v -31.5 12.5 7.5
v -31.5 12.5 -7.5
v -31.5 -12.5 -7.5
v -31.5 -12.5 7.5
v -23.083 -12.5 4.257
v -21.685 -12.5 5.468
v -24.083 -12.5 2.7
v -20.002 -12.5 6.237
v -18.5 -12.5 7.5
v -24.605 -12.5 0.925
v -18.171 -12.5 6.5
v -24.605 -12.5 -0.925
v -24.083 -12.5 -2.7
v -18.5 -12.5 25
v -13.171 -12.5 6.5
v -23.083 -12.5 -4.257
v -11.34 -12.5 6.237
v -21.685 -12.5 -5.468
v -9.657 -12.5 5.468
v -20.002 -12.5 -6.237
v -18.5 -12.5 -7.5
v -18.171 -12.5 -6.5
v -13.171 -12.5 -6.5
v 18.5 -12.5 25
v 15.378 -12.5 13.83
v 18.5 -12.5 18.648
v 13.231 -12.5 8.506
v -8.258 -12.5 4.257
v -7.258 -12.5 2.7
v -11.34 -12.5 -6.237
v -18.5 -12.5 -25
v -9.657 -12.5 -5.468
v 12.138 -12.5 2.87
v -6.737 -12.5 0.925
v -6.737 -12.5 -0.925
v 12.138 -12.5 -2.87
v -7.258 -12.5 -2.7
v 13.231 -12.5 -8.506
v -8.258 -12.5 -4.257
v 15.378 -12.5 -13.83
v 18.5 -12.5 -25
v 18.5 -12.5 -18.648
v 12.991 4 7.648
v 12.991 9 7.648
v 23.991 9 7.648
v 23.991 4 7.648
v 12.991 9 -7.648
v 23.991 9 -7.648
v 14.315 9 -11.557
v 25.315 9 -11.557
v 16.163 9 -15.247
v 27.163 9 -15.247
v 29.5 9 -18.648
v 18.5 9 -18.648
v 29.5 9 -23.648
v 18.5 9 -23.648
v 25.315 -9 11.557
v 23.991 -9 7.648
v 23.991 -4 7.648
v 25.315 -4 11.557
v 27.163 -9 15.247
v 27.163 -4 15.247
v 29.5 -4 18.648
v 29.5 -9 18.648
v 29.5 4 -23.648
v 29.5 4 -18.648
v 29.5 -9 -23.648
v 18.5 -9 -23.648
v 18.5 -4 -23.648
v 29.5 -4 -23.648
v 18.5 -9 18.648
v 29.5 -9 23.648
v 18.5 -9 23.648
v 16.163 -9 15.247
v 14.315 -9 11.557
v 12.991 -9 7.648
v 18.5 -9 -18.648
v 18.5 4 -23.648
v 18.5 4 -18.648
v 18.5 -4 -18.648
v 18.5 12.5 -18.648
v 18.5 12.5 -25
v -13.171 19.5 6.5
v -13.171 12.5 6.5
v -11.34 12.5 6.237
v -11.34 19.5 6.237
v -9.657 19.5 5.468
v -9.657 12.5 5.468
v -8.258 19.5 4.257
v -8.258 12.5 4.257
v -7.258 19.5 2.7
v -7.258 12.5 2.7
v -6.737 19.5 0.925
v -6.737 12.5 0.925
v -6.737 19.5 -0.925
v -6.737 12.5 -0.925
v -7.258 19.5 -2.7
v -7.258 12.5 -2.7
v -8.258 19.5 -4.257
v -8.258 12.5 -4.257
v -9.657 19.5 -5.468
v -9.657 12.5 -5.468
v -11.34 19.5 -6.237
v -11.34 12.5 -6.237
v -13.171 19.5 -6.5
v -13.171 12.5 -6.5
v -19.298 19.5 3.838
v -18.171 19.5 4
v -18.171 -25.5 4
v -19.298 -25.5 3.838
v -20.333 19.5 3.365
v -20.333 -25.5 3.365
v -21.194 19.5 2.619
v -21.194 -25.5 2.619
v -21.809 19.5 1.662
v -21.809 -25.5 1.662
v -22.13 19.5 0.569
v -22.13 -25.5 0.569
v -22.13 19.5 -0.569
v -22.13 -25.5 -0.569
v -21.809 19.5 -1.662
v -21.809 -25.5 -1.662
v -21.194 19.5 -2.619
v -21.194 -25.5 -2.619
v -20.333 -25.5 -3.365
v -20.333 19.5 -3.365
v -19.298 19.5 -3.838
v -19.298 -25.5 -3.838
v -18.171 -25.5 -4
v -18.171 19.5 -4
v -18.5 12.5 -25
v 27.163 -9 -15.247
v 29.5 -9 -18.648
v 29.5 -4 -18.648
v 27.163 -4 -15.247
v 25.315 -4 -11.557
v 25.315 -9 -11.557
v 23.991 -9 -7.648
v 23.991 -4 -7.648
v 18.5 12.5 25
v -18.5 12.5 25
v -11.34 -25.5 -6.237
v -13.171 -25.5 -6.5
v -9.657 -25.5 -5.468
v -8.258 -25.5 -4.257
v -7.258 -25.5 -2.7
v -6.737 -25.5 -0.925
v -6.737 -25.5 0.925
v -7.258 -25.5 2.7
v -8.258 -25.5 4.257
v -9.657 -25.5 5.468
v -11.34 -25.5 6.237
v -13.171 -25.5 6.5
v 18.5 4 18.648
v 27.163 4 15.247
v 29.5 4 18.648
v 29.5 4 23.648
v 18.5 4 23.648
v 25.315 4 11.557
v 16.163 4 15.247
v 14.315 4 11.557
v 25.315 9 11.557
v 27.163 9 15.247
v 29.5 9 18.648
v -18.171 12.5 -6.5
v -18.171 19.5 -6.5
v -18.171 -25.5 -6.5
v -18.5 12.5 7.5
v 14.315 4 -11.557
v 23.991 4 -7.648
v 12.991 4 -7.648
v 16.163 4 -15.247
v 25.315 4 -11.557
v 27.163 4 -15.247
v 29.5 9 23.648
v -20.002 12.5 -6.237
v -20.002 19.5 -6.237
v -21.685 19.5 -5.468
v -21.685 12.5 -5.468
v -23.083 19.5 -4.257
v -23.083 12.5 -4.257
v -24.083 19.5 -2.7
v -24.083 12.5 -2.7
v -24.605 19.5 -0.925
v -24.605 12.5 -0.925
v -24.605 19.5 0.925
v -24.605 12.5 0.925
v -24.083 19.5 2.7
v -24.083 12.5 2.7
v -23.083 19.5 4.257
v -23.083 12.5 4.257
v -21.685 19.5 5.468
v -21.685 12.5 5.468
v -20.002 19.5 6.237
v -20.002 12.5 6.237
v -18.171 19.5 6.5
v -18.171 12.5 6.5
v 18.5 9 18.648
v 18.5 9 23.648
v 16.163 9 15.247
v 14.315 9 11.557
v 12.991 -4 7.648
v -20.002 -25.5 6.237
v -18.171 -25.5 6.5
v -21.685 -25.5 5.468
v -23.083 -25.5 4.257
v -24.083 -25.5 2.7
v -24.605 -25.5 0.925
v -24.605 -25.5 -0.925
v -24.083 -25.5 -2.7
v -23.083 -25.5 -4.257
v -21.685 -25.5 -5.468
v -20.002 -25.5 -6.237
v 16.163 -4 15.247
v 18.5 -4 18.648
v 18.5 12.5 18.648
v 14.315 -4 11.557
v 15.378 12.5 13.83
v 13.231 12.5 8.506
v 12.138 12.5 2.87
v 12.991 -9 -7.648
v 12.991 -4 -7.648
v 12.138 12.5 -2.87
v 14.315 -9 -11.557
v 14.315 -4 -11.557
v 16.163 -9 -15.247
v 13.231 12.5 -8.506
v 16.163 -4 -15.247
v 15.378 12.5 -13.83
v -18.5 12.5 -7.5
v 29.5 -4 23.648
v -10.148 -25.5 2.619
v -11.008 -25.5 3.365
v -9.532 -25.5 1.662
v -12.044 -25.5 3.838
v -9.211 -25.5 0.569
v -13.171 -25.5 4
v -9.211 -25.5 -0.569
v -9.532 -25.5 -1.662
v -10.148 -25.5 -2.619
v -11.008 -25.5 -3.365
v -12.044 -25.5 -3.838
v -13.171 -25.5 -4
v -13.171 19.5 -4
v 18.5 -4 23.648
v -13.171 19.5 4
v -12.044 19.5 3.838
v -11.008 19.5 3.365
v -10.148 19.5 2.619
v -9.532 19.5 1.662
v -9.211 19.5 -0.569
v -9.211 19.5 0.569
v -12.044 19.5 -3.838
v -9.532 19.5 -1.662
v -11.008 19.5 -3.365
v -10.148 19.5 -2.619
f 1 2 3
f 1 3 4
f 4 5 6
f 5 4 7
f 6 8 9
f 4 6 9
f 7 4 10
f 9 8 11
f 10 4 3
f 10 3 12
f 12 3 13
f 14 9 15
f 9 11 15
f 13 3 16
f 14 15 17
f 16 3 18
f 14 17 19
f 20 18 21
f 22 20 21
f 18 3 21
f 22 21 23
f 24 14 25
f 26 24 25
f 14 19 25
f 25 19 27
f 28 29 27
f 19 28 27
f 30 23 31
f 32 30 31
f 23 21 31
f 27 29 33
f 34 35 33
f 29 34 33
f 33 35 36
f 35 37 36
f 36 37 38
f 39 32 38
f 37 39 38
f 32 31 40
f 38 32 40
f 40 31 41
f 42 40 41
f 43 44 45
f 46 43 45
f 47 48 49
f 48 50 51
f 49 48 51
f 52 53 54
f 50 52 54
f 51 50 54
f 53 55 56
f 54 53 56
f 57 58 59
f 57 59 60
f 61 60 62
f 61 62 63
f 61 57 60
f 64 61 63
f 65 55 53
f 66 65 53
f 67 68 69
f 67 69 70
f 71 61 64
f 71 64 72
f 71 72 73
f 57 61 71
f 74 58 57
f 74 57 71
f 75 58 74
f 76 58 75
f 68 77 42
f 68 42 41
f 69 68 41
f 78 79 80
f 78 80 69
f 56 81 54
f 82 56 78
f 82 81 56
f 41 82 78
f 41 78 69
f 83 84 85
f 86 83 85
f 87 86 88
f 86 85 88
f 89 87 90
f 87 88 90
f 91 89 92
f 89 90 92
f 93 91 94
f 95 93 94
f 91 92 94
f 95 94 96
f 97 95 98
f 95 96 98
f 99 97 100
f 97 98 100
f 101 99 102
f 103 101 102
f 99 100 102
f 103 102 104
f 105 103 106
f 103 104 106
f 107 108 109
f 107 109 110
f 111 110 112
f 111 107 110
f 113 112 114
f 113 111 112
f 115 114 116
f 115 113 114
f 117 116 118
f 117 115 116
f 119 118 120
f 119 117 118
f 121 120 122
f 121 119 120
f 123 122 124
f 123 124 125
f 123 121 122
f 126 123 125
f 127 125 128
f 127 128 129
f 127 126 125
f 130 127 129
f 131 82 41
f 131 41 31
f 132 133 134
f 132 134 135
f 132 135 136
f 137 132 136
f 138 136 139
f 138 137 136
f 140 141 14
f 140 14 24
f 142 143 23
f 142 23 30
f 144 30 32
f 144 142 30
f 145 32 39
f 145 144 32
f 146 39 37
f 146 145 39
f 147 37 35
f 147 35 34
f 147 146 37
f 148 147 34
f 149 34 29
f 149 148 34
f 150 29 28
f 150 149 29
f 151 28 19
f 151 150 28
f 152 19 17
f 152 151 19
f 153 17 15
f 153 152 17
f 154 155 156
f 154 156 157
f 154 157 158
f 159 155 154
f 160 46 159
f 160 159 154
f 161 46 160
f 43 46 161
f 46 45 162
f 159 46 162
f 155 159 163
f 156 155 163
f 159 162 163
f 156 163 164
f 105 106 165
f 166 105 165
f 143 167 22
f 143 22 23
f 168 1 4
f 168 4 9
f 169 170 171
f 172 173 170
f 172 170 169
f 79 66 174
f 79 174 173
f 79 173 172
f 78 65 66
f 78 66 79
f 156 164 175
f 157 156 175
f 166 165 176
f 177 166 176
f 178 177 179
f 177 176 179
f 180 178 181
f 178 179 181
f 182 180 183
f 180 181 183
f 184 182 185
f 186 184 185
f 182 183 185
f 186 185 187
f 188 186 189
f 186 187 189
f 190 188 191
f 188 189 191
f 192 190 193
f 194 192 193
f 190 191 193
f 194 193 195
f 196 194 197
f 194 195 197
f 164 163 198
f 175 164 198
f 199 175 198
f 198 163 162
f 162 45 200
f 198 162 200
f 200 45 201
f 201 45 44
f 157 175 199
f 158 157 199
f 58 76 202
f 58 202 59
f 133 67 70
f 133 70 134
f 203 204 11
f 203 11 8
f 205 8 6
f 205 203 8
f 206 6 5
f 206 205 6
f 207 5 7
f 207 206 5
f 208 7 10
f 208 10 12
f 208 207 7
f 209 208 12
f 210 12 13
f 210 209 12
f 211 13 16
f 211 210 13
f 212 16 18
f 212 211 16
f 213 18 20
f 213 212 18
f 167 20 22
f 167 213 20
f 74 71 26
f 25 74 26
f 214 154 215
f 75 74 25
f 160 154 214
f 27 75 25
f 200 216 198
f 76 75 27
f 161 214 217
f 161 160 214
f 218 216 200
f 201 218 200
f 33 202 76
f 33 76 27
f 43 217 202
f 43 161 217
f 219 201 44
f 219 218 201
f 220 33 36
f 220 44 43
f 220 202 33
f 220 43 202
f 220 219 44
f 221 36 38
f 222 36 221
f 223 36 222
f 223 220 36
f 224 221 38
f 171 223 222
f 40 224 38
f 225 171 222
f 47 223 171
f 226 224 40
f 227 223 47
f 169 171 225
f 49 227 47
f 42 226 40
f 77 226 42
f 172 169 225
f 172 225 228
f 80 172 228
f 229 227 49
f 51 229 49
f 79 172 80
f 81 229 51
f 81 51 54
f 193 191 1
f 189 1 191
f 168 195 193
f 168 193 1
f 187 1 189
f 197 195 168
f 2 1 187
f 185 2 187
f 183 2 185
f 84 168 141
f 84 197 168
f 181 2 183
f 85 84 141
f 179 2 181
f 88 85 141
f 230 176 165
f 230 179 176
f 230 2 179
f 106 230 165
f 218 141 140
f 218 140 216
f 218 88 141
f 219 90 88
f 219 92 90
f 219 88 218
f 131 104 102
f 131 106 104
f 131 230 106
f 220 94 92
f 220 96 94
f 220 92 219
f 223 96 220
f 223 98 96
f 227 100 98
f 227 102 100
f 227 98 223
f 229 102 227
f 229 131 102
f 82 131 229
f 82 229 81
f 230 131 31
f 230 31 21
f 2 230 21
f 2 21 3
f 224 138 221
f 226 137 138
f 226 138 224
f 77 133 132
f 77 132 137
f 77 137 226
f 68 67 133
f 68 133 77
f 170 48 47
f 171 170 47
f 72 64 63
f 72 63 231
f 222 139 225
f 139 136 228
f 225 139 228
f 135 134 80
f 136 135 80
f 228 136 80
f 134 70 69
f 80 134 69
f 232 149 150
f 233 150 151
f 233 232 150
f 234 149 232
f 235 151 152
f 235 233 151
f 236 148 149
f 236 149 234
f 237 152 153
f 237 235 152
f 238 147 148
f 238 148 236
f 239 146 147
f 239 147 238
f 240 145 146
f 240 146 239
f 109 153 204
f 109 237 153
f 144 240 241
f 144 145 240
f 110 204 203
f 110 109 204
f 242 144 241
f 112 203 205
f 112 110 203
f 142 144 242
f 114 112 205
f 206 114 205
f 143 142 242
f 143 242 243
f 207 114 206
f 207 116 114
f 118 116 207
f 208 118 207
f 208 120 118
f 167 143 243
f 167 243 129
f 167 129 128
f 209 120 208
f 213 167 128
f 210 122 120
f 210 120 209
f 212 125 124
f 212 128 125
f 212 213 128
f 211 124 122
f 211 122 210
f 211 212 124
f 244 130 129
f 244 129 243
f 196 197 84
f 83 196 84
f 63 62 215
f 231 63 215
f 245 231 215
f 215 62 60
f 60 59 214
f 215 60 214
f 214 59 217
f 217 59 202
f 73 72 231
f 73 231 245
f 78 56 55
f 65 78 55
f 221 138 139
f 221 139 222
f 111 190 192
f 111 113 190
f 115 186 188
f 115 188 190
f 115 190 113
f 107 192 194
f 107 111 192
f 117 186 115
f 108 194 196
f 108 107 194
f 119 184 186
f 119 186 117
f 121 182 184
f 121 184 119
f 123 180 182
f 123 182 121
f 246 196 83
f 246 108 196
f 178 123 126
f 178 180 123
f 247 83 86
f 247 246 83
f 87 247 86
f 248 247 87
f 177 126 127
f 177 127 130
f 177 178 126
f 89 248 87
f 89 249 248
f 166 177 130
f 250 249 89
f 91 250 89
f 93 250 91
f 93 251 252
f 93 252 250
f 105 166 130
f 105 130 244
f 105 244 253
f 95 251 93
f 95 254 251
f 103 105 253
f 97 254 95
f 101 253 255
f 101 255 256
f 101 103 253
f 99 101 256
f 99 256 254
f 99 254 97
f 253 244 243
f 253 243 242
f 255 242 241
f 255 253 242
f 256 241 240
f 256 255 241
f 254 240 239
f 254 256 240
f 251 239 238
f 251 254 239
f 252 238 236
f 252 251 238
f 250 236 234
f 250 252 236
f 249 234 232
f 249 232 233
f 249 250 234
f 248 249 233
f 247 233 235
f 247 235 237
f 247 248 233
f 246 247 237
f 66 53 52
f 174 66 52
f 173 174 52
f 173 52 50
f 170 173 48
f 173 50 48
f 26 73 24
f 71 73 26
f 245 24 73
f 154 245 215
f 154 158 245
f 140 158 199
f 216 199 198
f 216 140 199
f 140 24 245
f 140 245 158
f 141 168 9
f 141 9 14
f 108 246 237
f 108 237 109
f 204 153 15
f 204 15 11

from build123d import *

# Parameters (mm, degrees)
EXTRUDE_1_DEPTH     = 12.5
EXTRUDE_START       = 5
EXTRUDE_3_DEPTH     = 5
EXTRUDE_4_DEPTH     = 7
EXTRUDE_START_2     = -45
EXTRUDE_5_DEPTH     = 45
CUT_EXTRUDE_1_DEPTH = 45


with BuildPart() as part:
    # 草图1 → 凸台-拉伸1 (new, symmetric)
    with BuildSketch(Plane(origin=(0, 0, 0), x_dir=(1, 0, 0), z_dir=(0, 1, 0))):
        with BuildLine():
            Line((18.5, 18.648056199), (18.5, 25))
            Line((18.5, 25), (-18.5, 25))
            Line((-18.5, 25), (-18.5, 7.5))
            Line((-18.5, 7.5), (-31.5, 7.5))
            Line((-31.5, 7.5), (-31.5, -7.5))
            Line((-31.5, -7.5), (-18.5, -7.5))
            Line((-18.5, -7.5), (-18.5, -25))
            Line((-18.5, -25), (18.5, -25))
            Line((18.5, -25), (18.5, -18.648056199))
            ThreePointArc((18.5, -18.648056199), (12, 0), (18.5, 18.648056199))
        make_face()
    extrude(amount=EXTRUDE_1_DEPTH, both=True)

    # 草图2 → 凸台-拉伸3 (add)
    with BuildSketch(Plane(origin=(0, 4, 0), x_dir=(1, 0, 0), z_dir=(0, 1, 0)).offset(EXTRUDE_START)):
        with BuildLine():
            Line((18.5, 23.648056199), (29.5, 23.648056199))
            Line((29.5, 23.648056199), (29.5, 18.648056199))
            ThreePointArc((29.5, 18.648056199), (26.175718971, 13.433463712), (23.991255863, 7.648056199))
            Line((23.991255863, 7.648056199), (12.991255863, 7.648056199))
            ThreePointArc((12.991255863, 7.648056199), (15.175718971, 13.433463712), (18.5, 18.648056199))
            Line((18.5, 18.648056199), (18.5, 23.648056199))
        make_face()
        with BuildLine():
            Line((12.991255863, -7.648056199), (23.991255863, -7.648056199))
            ThreePointArc((23.991255863, -7.648056199), (26.175718971, -13.433463712), (29.5, -18.648056199))
            Line((29.5, -18.648056199), (29.5, -23.648056199))
            Line((29.5, -23.648056199), (18.5, -23.648056199))
            Line((18.5, -23.648056199), (18.5, -18.648056199))
            ThreePointArc((18.5, -18.648056199), (15.175718971, -13.433463712), (12.991255863, -7.648056199))
        make_face()
    extrude_3 = extrude(amount=-EXTRUDE_3_DEPTH)

    # 镜向1: 凸台-拉伸3 across plane
    add(extrude_3.mirror(Plane.ZX))

    # 草图3 → 凸台-拉伸4 (add)
    with BuildSketch(Plane(origin=(0, 12.5, 0), x_dir=(1, 0, 0), z_dir=(0, 1, 0))):
        with BuildLine():
            Line((-13.170764362, 6.5), (-18.170764362, 6.5))
            ThreePointArc((-18.170764362, 6.5), (-24.670764362, 0), (-18.170764362, -6.5))
            Line((-18.170764362, -6.5), (-13.170764362, -6.5))
            ThreePointArc((-13.170764362, -6.5), (-6.670764362, 0), (-13.170764362, 6.5))
        make_face()
    extrude(amount=EXTRUDE_4_DEPTH)

    # 草图5 → 凸台-拉伸5 (add)
    with BuildSketch(Plane(origin=(0, 19.5, 0), x_dir=(1, 0, 0), z_dir=(0, 1, 0)).offset(EXTRUDE_START_2)):
        with BuildLine():
            Line((-18.170764362, 6.5), (-13.170764362, 6.5))
            ThreePointArc((-13.170764362, 6.5), (-6.670764362, 0), (-13.170764362, -6.5))
            Line((-13.170764362, -6.5), (-18.170764362, -6.5))
            ThreePointArc((-18.170764362, -6.5), (-24.670764362, 0), (-18.170764362, 6.5))
        make_face()
    extrude(amount=EXTRUDE_5_DEPTH)

    # 草图6 → 切除-拉伸1 (cut)
    with BuildSketch(Plane(origin=(0, 19.5, 0), x_dir=(1, 0, 0), z_dir=(0, 1, 0))):
        with BuildLine():
            Line((-18.170764362, 4), (-13.170764362, 4))
            ThreePointArc((-13.170764362, 4), (-9.170764362, 0), (-13.170764362, -4))
            Line((-13.170764362, -4), (-18.170764362, -4))
            ThreePointArc((-18.170764362, -4), (-22.170764362, 0), (-18.170764362, 4))
        make_face()
    extrude(amount=-CUT_EXTRUDE_1_DEPTH, mode=Mode.SUBTRACT)


solid = part.part
